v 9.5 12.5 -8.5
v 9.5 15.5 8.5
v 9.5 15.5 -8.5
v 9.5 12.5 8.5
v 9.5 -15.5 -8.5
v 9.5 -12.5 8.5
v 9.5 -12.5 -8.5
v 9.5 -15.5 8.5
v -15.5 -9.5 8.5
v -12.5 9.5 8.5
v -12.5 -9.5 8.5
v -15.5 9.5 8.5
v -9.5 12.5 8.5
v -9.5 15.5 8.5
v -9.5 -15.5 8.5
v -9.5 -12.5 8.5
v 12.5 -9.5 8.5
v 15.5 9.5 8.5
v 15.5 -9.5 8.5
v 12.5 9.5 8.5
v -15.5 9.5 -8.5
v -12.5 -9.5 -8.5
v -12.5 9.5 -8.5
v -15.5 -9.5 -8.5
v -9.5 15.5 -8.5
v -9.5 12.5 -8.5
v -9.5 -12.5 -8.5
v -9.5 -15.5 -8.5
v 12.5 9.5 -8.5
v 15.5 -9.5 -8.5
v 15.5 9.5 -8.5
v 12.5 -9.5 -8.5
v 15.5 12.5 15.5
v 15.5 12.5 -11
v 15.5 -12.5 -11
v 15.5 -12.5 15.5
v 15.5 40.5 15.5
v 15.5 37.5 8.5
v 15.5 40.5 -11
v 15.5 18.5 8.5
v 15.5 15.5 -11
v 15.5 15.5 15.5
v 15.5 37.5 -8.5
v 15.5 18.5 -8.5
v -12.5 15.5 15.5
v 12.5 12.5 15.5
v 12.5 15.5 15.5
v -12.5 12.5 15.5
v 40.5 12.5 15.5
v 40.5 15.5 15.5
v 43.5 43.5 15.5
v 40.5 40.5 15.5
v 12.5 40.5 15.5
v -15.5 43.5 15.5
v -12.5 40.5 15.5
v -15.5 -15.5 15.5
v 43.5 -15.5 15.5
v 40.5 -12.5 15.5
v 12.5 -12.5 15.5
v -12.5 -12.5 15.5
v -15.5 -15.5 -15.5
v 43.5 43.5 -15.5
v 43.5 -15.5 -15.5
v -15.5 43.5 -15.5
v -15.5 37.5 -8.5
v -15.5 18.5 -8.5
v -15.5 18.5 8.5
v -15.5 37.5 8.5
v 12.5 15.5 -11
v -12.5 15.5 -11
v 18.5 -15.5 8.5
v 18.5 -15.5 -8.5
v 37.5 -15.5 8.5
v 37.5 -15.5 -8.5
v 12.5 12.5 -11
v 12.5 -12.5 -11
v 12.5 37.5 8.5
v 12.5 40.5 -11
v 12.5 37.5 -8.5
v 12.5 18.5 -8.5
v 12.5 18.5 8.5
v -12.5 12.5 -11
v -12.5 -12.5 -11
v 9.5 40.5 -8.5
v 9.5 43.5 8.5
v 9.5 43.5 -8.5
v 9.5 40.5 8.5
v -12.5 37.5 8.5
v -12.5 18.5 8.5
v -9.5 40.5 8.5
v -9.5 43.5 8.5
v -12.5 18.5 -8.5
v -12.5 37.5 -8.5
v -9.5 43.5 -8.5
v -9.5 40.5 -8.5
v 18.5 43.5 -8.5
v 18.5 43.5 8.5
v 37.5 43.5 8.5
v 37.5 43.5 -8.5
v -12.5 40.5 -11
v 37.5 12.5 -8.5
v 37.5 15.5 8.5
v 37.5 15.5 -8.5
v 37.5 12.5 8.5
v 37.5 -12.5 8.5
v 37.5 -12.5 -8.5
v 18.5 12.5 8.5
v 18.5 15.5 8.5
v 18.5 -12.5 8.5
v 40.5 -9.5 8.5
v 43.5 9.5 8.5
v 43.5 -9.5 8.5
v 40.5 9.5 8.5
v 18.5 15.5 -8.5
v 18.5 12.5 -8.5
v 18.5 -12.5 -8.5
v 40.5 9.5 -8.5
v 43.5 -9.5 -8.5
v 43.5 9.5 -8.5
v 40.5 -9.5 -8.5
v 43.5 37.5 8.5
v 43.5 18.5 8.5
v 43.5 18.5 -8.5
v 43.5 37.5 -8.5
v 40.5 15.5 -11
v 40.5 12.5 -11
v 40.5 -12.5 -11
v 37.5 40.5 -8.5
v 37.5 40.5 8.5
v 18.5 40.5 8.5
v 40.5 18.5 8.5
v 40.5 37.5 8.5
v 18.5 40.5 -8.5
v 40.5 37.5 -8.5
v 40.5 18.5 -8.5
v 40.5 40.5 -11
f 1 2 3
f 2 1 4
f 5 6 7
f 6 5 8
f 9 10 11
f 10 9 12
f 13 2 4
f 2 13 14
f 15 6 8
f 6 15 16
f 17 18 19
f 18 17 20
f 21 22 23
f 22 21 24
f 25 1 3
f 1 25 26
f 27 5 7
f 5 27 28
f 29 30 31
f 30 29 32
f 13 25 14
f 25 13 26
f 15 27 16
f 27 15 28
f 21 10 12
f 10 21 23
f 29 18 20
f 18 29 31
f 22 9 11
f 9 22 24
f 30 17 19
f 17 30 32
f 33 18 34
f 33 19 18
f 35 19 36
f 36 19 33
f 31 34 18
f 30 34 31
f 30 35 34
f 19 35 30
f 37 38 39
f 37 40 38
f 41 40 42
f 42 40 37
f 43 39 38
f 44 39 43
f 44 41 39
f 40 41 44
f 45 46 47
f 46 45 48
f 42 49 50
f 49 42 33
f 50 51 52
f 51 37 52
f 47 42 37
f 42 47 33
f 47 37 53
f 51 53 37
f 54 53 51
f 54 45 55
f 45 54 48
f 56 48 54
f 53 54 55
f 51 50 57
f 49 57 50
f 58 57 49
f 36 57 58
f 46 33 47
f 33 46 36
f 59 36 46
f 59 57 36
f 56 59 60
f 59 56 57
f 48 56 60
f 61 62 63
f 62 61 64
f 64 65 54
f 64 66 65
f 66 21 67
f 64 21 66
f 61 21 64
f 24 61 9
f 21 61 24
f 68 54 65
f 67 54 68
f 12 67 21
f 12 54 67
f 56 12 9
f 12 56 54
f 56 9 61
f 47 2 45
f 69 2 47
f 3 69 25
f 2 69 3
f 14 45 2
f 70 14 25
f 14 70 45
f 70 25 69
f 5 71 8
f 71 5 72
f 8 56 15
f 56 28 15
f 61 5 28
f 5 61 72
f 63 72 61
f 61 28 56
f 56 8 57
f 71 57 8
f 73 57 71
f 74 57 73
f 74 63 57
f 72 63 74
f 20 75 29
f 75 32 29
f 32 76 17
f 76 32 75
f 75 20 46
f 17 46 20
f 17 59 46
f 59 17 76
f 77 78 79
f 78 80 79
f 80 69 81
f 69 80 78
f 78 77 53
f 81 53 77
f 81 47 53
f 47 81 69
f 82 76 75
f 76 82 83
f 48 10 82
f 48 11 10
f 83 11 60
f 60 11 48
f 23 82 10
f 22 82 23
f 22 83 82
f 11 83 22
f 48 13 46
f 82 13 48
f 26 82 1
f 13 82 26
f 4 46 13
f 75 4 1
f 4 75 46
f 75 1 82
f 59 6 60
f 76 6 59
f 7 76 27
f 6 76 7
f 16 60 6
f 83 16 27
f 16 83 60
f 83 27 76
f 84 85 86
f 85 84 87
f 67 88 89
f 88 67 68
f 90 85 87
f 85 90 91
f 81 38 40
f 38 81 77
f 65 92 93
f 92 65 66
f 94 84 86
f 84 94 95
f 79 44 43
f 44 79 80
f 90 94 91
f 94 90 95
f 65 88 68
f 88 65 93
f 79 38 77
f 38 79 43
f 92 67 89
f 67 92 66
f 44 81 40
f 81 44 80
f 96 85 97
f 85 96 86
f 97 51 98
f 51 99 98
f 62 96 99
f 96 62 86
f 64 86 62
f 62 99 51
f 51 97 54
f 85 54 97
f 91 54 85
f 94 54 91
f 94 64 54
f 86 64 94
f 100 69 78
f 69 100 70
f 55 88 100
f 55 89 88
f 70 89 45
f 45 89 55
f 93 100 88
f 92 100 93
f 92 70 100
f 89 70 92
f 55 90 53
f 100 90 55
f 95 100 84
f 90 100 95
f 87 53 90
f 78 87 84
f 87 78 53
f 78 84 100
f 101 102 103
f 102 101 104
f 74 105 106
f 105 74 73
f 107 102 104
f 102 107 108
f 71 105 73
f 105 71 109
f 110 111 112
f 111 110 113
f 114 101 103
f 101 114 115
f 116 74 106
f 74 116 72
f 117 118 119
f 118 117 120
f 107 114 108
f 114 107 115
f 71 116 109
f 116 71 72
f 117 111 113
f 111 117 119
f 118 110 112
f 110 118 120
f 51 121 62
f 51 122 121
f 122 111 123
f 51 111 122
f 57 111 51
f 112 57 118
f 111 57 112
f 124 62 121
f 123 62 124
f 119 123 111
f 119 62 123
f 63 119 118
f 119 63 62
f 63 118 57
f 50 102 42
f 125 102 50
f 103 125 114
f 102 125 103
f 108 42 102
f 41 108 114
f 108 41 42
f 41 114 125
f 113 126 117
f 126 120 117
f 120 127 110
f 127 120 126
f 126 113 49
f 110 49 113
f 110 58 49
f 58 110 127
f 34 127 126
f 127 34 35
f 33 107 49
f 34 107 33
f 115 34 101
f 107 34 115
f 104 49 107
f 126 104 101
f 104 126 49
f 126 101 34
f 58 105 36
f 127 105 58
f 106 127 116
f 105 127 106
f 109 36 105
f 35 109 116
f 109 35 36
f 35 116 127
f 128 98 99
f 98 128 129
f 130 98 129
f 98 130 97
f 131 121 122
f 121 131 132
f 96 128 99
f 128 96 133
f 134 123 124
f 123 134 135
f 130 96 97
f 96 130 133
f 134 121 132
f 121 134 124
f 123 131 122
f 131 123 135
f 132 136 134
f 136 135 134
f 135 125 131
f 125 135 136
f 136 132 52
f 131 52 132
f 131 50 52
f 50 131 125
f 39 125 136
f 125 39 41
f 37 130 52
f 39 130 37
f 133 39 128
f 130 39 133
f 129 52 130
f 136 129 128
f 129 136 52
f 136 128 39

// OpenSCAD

//  Size of the holes in each container  
hole_size = 25; //  [1:100]

//  The thicknes of each wall around the hole
wall_thickness = 3; // [1,2,3,4,5,6,7,8,9,10]

//  How many containers on the x axis
containers_length = 2; // [1,2,3,4,5,6,7,8,9,10]

//  How many containers on the y axis
containers_width = 2; // [1,2,3,4,5,6,7,8,9,10]

//  Holes in walls
wall_holes_enabled = "yes"; // ["yes","no"]

//  Height multiplier
height_multiplier = 1; // [0.5,1,2]

for(x = [0:containers_length-1]){
    for(y = [0:containers_width-1]){
        
        translate([x*(hole_size+wall_thickness),y*(hole_size+wall_thickness),0]){
        
            difference() {
                //Outer walls
                cube([hole_size+(wall_thickness*2),hole_size+(wall_thickness*2),(hole_size+(wall_thickness*2))*height_multiplier],center=true);
                //Hole
                translate([0,0,wall_thickness]){
                    cube([hole_size, hole_size,(hole_size+wall_thickness)*height_multiplier],center=true);
                    
                }
                
                if(wall_holes_enabled == "yes"){
                    //Wall Holes Y
                    cube([hole_size-wall_thickness*2,.5+hole_size+wall_thickness*2,(hole_size*height_multiplier*.7)-.5],center=true);
                    
                    //Wall Holes X
                    cube([.5+hole_size+wall_thickness*2,hole_size-wall_thickness*2,(hole_size*height_multiplier*.7)-.5],center=true);
                }
            }
        } // end translate x and y
    } // end y loop
} // end x loop
